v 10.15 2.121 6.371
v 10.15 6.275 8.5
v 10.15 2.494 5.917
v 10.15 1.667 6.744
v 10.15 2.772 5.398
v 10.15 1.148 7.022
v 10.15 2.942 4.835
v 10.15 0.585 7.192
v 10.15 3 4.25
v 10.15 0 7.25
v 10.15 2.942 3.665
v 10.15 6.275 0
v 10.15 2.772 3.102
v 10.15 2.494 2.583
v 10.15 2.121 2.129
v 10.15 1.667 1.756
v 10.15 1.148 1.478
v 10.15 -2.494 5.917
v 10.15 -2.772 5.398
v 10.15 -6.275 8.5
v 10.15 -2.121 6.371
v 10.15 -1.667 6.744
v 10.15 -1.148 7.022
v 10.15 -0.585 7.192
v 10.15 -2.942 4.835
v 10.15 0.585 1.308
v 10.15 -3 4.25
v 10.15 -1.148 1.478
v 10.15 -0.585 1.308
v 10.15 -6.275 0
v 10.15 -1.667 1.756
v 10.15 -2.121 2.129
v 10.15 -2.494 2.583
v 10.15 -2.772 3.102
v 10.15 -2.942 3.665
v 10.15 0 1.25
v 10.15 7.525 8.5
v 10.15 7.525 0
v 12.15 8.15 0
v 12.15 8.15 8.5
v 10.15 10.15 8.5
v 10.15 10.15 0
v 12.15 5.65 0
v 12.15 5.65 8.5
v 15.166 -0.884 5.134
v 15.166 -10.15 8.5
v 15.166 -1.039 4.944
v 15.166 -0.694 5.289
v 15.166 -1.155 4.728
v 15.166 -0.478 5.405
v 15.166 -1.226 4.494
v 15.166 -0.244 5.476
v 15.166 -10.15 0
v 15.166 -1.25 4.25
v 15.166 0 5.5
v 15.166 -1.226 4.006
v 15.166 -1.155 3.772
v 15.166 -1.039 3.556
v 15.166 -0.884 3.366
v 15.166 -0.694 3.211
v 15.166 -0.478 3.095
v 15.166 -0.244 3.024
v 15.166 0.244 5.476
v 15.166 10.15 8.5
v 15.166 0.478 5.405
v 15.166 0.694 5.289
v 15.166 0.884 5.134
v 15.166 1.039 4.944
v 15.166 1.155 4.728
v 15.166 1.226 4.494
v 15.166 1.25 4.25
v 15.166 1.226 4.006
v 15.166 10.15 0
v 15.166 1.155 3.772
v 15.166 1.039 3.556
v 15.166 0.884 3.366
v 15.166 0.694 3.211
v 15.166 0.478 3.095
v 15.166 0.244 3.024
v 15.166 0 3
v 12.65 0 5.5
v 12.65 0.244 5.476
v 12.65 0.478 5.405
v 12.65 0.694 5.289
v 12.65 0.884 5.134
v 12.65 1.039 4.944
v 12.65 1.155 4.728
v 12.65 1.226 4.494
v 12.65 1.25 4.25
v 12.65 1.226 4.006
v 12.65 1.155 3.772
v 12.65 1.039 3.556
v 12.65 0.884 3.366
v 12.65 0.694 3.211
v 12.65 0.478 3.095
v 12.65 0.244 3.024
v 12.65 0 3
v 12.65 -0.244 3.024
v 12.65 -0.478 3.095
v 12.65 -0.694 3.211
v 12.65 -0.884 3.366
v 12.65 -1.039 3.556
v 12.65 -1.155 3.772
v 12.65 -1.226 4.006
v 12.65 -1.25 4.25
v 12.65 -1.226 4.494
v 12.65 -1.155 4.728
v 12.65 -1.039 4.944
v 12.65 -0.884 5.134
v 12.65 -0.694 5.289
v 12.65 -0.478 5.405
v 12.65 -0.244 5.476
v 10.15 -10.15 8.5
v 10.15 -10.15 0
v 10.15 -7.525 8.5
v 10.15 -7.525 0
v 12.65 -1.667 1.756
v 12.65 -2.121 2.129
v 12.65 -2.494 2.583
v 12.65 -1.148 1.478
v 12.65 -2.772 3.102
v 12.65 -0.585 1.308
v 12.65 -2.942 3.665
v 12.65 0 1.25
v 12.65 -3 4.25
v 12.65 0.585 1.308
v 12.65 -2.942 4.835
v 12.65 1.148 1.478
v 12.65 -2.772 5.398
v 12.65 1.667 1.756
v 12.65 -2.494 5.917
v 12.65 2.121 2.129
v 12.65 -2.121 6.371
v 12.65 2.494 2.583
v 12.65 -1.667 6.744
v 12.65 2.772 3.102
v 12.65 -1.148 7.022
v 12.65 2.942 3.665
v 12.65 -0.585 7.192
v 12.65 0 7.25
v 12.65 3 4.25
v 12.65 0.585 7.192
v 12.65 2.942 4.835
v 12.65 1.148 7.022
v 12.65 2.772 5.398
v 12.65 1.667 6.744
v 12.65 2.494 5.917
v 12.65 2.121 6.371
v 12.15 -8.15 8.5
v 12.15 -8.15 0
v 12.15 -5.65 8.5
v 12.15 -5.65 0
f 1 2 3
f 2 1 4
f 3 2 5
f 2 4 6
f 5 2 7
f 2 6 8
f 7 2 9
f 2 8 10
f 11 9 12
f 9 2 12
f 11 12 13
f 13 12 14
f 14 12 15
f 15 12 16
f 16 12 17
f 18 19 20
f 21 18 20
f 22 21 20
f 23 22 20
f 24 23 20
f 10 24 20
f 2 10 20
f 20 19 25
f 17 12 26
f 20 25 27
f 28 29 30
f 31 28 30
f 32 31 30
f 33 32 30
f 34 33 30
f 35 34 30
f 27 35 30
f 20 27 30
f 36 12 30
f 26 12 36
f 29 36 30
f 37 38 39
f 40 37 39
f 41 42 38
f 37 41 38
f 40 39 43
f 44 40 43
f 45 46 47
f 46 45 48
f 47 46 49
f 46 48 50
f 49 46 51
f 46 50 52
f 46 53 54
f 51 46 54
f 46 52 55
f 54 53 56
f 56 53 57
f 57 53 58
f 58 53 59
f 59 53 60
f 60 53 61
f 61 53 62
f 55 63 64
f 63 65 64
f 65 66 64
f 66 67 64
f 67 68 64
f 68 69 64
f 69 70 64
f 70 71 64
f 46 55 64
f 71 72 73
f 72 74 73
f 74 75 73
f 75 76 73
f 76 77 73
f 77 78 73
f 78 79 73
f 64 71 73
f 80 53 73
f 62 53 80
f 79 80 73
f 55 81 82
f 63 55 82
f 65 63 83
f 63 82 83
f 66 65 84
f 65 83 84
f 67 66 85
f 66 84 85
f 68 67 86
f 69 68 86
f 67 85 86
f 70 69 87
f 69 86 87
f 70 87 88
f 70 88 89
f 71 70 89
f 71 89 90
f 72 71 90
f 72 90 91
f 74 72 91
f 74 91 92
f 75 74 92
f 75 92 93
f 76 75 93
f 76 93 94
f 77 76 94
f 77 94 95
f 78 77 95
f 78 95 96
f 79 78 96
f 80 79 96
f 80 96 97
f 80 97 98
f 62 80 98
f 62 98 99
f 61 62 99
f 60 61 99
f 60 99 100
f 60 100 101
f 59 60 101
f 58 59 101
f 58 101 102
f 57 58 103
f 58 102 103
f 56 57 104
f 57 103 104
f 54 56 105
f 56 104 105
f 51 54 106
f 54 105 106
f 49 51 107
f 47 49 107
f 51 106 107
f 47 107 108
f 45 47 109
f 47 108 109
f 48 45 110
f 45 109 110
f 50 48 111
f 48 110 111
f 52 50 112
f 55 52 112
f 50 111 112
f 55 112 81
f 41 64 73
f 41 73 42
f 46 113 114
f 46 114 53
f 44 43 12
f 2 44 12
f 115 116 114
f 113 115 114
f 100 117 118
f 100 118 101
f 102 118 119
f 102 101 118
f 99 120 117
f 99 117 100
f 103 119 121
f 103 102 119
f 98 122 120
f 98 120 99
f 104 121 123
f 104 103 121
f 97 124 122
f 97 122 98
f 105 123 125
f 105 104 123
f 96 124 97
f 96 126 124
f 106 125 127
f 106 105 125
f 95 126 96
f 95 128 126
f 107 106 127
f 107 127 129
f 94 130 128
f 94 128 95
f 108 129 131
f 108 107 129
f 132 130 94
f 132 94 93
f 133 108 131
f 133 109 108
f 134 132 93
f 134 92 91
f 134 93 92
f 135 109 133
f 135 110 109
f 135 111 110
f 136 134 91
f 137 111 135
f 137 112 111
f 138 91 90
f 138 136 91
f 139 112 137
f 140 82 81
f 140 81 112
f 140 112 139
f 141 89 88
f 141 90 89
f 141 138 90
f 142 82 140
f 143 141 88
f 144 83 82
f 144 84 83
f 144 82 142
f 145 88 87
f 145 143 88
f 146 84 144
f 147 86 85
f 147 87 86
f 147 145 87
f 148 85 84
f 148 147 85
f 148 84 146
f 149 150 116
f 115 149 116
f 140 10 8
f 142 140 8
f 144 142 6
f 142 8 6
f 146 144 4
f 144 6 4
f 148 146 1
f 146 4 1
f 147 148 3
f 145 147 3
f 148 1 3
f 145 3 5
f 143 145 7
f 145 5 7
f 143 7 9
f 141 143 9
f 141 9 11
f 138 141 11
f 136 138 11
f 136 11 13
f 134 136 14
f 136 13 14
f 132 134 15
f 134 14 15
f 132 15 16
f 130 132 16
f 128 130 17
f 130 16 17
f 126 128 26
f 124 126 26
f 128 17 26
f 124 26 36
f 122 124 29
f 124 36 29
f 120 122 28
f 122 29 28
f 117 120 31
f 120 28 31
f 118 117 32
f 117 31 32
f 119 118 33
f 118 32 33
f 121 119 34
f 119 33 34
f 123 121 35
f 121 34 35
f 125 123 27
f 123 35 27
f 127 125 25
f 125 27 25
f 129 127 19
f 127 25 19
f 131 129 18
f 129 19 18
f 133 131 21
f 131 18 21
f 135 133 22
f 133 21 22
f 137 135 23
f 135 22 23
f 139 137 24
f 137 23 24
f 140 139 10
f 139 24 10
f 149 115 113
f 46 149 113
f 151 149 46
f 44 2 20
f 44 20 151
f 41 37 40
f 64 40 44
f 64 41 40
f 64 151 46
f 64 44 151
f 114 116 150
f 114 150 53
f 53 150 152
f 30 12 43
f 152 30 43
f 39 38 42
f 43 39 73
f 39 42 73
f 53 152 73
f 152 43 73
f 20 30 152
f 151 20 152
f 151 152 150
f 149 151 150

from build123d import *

# Parameters (mm, degrees)
SALIENTE_EXTRUIR1_DEPTH = 8.5
CROQUIS2_R              = 1.25
CORTAR_EXTRUIR1_DEPTH   = 8.5
CROQUIS3_R              = 3
CORTAR_EXTRUIR2_DEPTH   = 2.5


with BuildPart() as part:
    # Croquis1 → Saliente-Extruir1 (new body)
    with BuildSketch(Plane.XY):
        Polygon((12.15, 8.15), (12.15, 5.65), (10.15, 6.275), (10.15, -6.275), (12.15, -5.65), (12.15, -8.15), (10.15, -7.525), (10.15, -10.15), (15.165647838, -10.15), (15.165647838, 10.15), (10.15, 10.15), (10.15, 7.525), align=None)
    extrude(amount=SALIENTE_EXTRUIR1_DEPTH)

    # Croquis2 → Cortar-Extruir1 (cut)
    with BuildSketch(Plane.ZY.offset(-10.15)):
        with Locations((4.25, 0)):
            Circle(CROQUIS2_R)
    extrude(amount=-CORTAR_EXTRUIR1_DEPTH, mode=Mode.SUBTRACT)

    # Croquis3 → Cortar-Extruir2 (cut)
    with BuildSketch(Plane.ZY.offset(-10.15)):
        with Locations((4.25, 0)):
            Circle(CROQUIS3_R)
    extrude(amount=-CORTAR_EXTRUIR2_DEPTH, mode=Mode.SUBTRACT)


solid = part.part
